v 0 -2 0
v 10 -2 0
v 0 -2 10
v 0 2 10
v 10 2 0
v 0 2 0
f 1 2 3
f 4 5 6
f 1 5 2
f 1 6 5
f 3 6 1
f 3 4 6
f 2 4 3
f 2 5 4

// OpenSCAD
b = 10;
h = 10;
w = 4;

//Start with an extruded triangle
color("red")
translate([0,0,0])
rotate(a=[270,-90,0])
linear_extrude(height = w, center = true, convexity = 10, twist = 0)
polygon(points=[[0,0],[h,0],[0,b]], paths=[[0,1,2]]);
